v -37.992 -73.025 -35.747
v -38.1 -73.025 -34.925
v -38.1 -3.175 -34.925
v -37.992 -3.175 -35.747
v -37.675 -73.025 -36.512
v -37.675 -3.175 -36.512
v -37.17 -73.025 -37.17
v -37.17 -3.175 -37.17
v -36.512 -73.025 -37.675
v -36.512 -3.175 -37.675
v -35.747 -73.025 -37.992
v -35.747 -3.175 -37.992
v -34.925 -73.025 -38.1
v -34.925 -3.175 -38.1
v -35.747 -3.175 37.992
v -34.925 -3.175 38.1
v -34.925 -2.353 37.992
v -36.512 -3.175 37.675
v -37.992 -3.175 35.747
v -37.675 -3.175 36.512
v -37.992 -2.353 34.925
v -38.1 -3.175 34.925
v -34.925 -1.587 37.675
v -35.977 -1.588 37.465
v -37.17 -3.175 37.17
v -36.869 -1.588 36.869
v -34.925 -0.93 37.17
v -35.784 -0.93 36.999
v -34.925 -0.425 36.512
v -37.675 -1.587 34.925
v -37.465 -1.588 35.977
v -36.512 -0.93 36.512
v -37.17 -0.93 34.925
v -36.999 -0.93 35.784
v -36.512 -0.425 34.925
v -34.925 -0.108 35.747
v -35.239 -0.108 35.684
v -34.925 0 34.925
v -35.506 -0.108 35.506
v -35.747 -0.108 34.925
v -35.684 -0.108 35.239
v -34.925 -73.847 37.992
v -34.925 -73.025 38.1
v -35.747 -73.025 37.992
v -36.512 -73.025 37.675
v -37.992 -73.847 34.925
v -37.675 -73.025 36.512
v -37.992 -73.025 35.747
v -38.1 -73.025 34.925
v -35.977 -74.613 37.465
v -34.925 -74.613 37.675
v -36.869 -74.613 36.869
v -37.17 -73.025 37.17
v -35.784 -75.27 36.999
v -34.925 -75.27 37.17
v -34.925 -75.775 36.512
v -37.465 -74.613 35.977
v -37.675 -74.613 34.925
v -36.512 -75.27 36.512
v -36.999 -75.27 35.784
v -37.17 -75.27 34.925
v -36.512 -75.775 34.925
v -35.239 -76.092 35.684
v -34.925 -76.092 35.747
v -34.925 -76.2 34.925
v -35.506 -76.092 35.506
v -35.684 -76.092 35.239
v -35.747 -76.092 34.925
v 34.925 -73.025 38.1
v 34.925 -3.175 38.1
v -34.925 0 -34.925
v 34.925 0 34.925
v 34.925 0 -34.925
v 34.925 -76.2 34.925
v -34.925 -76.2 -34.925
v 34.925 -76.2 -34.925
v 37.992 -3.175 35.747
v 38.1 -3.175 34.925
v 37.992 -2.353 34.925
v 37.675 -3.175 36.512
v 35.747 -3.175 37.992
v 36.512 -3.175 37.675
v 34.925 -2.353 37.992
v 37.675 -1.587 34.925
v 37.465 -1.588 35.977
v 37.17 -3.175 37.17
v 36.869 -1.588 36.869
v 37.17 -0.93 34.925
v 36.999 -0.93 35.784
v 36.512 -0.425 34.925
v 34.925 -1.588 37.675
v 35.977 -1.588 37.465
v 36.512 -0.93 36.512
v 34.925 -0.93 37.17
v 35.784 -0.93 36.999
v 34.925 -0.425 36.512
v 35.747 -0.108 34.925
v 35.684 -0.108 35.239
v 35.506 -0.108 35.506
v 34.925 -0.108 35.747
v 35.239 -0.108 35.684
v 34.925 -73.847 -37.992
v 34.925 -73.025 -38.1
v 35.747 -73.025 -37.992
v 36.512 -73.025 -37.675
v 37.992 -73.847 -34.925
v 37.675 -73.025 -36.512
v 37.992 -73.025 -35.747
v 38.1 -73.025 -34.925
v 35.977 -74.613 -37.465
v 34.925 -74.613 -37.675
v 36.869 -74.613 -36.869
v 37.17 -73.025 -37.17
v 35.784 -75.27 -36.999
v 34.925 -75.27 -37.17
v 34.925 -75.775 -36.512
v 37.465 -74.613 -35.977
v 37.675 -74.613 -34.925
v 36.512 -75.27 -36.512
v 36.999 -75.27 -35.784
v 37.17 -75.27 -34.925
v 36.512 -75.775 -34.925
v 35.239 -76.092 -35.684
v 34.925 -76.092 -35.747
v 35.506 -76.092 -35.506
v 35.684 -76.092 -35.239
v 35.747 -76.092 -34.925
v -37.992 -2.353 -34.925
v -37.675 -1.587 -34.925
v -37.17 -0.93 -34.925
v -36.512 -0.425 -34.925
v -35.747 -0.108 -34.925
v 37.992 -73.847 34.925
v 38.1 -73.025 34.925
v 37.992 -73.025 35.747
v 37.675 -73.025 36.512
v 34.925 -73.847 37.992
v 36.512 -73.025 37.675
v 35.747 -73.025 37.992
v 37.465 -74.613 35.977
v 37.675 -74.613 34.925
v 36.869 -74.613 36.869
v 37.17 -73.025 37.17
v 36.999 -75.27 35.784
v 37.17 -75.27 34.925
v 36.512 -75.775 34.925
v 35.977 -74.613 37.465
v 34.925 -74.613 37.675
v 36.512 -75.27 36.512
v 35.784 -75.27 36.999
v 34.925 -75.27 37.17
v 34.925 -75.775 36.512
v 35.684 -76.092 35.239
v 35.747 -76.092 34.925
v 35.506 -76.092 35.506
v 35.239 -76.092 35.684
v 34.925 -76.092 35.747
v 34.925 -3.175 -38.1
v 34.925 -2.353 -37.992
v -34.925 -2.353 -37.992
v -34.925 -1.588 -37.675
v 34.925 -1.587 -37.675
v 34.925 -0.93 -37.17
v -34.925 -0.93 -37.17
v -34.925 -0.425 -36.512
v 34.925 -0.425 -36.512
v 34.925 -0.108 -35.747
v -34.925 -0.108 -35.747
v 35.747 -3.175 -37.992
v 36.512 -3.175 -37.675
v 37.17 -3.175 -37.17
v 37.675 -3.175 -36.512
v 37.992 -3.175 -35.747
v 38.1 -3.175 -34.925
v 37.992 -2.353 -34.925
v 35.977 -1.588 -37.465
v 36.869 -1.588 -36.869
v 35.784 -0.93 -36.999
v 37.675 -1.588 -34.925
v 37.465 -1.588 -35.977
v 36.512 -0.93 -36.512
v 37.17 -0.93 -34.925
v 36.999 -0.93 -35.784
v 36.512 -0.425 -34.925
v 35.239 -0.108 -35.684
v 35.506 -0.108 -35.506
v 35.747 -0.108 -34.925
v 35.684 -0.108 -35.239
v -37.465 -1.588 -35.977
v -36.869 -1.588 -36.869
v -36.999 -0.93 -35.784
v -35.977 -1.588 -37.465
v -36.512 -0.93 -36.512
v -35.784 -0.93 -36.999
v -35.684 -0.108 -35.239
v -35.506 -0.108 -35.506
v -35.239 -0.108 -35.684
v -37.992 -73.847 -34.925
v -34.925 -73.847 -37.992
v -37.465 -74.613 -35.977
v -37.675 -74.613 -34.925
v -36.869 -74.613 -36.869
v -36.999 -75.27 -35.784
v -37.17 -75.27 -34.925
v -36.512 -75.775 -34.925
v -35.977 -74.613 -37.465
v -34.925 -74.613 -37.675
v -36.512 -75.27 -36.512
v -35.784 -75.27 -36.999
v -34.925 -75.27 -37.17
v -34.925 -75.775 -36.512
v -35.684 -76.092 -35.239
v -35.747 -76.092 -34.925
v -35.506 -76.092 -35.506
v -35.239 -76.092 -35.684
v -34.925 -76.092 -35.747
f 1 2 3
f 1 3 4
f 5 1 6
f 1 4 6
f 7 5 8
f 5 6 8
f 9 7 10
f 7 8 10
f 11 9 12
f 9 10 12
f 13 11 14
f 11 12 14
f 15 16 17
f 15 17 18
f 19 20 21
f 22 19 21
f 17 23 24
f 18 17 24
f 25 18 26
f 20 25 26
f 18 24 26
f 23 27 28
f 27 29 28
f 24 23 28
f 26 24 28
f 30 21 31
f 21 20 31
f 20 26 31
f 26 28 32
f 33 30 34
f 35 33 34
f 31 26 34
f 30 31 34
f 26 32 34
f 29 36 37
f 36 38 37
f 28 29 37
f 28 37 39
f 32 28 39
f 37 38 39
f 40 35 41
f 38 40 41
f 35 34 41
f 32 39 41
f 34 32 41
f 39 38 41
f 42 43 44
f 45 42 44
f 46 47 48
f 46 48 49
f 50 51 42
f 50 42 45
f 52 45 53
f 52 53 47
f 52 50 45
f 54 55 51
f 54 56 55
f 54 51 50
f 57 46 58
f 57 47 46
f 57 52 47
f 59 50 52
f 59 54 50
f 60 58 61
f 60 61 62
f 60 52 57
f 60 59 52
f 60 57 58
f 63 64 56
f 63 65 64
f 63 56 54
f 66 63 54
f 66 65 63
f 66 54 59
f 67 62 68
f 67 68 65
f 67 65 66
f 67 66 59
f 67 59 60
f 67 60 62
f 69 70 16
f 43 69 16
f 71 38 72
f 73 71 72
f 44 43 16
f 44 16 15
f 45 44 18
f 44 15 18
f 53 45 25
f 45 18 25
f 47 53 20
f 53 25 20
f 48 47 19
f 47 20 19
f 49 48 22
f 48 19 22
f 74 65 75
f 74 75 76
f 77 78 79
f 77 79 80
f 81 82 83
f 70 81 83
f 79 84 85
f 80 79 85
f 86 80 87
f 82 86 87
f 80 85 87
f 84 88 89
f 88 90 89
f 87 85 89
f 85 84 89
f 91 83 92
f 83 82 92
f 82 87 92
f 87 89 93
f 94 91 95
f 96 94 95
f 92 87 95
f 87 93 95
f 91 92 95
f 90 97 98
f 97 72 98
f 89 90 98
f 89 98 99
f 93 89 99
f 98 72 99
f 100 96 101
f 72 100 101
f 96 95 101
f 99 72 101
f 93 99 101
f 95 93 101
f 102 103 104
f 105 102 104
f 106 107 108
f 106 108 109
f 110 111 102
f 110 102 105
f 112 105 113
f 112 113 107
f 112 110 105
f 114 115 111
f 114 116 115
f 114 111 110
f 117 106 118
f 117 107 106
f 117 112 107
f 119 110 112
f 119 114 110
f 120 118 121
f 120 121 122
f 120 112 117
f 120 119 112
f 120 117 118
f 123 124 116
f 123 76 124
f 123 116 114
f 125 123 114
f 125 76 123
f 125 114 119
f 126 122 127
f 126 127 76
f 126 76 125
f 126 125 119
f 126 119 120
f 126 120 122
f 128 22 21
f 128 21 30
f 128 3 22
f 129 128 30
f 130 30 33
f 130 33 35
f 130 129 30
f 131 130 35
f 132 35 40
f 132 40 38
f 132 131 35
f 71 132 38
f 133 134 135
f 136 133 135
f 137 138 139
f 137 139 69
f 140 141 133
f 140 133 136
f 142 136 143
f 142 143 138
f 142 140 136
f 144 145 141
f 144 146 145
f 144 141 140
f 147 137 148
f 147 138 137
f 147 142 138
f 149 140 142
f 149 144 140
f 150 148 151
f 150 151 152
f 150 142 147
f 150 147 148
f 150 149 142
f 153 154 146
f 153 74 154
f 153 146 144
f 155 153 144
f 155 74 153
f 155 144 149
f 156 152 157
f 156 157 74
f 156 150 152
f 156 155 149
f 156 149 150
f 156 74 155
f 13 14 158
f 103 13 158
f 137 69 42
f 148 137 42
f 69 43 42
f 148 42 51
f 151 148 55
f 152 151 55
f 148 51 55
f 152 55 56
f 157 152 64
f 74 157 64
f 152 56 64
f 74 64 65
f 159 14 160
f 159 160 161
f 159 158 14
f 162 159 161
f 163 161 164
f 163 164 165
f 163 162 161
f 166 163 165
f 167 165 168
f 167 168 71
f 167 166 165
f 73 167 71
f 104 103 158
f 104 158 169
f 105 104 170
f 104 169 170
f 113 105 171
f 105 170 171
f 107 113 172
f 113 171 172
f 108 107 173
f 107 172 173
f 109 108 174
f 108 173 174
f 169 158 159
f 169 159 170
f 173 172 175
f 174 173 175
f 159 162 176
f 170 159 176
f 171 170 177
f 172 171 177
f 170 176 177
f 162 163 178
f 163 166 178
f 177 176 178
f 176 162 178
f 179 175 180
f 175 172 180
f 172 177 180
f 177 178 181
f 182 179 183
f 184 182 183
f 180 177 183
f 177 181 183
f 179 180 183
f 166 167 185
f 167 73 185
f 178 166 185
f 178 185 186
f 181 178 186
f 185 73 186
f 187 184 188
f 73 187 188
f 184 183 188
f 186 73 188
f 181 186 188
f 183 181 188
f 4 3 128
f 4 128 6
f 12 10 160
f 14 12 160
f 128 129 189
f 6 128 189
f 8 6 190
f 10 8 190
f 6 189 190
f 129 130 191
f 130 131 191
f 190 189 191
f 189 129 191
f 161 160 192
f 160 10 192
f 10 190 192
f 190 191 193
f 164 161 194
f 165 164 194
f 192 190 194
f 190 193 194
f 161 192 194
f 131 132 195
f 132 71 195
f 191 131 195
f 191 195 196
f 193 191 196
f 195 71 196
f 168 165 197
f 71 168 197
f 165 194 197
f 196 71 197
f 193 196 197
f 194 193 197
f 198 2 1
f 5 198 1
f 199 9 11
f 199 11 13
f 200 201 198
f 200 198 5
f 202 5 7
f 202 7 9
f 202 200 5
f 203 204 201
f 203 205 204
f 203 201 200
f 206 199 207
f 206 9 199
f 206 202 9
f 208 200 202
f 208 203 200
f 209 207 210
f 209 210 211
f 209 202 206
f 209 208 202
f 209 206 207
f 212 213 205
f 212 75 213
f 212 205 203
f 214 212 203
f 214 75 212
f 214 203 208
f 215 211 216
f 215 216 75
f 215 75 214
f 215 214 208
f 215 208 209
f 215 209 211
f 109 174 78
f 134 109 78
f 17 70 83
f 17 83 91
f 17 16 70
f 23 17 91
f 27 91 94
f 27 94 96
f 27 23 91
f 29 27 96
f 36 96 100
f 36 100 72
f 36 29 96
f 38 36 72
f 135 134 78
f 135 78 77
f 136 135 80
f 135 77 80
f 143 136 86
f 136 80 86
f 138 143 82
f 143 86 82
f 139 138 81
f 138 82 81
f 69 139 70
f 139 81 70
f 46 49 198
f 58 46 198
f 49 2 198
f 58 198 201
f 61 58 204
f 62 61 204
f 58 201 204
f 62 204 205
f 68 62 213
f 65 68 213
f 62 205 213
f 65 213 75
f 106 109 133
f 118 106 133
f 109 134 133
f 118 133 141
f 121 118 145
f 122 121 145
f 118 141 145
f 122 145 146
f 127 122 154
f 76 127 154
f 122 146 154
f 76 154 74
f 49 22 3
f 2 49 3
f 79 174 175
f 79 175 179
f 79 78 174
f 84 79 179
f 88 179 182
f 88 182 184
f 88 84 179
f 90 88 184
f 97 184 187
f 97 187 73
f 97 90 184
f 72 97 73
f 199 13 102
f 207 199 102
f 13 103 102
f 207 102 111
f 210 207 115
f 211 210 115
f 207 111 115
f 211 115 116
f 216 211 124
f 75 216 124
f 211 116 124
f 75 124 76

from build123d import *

# Parameters (mm, degrees)
F1_DEPTH = 76.2
F2_R     = 3.175


with BuildPart() as f1:
    # F0 (on Front) → F1 (new body)
    with BuildSketch(Plane.XZ):
        with BuildLine():
            Line((34.925, 38.1), (-34.925, 38.1))
            ThreePointArc((-34.925, 38.1), (-37.170064, 37.170064), (-38.1, 34.925))
            Line((-38.1, 34.925), (-38.1, -34.925))
            ThreePointArc((-38.1, -34.925), (-37.170064, -37.170064), (-34.925, -38.1))
            Line((-34.925, -38.1), (34.925, -38.1))
            ThreePointArc((34.925, -38.1), (37.170064, -37.170064), (38.1, -34.925))
            Line((38.1, -34.925), (38.1, 34.925))
            ThreePointArc((38.1, 34.925), (37.170064, 37.170064), (34.925, 38.1))
        make_face()
    extrude(amount=F1_DEPTH)

    # F2
    f2_edges = [f1.edges().sort_by_distance(p)[0] for p in [
        (0, -76.2, 38.1),
        (-38.1, -76.2, 0),
        (0, -76.2, -38.1),
        (38.1, -76.2, 0),
        (-38.1, 0, 0),
    ]]
    fillet(f2_edges, radius=F2_R)


solid = f1.part
